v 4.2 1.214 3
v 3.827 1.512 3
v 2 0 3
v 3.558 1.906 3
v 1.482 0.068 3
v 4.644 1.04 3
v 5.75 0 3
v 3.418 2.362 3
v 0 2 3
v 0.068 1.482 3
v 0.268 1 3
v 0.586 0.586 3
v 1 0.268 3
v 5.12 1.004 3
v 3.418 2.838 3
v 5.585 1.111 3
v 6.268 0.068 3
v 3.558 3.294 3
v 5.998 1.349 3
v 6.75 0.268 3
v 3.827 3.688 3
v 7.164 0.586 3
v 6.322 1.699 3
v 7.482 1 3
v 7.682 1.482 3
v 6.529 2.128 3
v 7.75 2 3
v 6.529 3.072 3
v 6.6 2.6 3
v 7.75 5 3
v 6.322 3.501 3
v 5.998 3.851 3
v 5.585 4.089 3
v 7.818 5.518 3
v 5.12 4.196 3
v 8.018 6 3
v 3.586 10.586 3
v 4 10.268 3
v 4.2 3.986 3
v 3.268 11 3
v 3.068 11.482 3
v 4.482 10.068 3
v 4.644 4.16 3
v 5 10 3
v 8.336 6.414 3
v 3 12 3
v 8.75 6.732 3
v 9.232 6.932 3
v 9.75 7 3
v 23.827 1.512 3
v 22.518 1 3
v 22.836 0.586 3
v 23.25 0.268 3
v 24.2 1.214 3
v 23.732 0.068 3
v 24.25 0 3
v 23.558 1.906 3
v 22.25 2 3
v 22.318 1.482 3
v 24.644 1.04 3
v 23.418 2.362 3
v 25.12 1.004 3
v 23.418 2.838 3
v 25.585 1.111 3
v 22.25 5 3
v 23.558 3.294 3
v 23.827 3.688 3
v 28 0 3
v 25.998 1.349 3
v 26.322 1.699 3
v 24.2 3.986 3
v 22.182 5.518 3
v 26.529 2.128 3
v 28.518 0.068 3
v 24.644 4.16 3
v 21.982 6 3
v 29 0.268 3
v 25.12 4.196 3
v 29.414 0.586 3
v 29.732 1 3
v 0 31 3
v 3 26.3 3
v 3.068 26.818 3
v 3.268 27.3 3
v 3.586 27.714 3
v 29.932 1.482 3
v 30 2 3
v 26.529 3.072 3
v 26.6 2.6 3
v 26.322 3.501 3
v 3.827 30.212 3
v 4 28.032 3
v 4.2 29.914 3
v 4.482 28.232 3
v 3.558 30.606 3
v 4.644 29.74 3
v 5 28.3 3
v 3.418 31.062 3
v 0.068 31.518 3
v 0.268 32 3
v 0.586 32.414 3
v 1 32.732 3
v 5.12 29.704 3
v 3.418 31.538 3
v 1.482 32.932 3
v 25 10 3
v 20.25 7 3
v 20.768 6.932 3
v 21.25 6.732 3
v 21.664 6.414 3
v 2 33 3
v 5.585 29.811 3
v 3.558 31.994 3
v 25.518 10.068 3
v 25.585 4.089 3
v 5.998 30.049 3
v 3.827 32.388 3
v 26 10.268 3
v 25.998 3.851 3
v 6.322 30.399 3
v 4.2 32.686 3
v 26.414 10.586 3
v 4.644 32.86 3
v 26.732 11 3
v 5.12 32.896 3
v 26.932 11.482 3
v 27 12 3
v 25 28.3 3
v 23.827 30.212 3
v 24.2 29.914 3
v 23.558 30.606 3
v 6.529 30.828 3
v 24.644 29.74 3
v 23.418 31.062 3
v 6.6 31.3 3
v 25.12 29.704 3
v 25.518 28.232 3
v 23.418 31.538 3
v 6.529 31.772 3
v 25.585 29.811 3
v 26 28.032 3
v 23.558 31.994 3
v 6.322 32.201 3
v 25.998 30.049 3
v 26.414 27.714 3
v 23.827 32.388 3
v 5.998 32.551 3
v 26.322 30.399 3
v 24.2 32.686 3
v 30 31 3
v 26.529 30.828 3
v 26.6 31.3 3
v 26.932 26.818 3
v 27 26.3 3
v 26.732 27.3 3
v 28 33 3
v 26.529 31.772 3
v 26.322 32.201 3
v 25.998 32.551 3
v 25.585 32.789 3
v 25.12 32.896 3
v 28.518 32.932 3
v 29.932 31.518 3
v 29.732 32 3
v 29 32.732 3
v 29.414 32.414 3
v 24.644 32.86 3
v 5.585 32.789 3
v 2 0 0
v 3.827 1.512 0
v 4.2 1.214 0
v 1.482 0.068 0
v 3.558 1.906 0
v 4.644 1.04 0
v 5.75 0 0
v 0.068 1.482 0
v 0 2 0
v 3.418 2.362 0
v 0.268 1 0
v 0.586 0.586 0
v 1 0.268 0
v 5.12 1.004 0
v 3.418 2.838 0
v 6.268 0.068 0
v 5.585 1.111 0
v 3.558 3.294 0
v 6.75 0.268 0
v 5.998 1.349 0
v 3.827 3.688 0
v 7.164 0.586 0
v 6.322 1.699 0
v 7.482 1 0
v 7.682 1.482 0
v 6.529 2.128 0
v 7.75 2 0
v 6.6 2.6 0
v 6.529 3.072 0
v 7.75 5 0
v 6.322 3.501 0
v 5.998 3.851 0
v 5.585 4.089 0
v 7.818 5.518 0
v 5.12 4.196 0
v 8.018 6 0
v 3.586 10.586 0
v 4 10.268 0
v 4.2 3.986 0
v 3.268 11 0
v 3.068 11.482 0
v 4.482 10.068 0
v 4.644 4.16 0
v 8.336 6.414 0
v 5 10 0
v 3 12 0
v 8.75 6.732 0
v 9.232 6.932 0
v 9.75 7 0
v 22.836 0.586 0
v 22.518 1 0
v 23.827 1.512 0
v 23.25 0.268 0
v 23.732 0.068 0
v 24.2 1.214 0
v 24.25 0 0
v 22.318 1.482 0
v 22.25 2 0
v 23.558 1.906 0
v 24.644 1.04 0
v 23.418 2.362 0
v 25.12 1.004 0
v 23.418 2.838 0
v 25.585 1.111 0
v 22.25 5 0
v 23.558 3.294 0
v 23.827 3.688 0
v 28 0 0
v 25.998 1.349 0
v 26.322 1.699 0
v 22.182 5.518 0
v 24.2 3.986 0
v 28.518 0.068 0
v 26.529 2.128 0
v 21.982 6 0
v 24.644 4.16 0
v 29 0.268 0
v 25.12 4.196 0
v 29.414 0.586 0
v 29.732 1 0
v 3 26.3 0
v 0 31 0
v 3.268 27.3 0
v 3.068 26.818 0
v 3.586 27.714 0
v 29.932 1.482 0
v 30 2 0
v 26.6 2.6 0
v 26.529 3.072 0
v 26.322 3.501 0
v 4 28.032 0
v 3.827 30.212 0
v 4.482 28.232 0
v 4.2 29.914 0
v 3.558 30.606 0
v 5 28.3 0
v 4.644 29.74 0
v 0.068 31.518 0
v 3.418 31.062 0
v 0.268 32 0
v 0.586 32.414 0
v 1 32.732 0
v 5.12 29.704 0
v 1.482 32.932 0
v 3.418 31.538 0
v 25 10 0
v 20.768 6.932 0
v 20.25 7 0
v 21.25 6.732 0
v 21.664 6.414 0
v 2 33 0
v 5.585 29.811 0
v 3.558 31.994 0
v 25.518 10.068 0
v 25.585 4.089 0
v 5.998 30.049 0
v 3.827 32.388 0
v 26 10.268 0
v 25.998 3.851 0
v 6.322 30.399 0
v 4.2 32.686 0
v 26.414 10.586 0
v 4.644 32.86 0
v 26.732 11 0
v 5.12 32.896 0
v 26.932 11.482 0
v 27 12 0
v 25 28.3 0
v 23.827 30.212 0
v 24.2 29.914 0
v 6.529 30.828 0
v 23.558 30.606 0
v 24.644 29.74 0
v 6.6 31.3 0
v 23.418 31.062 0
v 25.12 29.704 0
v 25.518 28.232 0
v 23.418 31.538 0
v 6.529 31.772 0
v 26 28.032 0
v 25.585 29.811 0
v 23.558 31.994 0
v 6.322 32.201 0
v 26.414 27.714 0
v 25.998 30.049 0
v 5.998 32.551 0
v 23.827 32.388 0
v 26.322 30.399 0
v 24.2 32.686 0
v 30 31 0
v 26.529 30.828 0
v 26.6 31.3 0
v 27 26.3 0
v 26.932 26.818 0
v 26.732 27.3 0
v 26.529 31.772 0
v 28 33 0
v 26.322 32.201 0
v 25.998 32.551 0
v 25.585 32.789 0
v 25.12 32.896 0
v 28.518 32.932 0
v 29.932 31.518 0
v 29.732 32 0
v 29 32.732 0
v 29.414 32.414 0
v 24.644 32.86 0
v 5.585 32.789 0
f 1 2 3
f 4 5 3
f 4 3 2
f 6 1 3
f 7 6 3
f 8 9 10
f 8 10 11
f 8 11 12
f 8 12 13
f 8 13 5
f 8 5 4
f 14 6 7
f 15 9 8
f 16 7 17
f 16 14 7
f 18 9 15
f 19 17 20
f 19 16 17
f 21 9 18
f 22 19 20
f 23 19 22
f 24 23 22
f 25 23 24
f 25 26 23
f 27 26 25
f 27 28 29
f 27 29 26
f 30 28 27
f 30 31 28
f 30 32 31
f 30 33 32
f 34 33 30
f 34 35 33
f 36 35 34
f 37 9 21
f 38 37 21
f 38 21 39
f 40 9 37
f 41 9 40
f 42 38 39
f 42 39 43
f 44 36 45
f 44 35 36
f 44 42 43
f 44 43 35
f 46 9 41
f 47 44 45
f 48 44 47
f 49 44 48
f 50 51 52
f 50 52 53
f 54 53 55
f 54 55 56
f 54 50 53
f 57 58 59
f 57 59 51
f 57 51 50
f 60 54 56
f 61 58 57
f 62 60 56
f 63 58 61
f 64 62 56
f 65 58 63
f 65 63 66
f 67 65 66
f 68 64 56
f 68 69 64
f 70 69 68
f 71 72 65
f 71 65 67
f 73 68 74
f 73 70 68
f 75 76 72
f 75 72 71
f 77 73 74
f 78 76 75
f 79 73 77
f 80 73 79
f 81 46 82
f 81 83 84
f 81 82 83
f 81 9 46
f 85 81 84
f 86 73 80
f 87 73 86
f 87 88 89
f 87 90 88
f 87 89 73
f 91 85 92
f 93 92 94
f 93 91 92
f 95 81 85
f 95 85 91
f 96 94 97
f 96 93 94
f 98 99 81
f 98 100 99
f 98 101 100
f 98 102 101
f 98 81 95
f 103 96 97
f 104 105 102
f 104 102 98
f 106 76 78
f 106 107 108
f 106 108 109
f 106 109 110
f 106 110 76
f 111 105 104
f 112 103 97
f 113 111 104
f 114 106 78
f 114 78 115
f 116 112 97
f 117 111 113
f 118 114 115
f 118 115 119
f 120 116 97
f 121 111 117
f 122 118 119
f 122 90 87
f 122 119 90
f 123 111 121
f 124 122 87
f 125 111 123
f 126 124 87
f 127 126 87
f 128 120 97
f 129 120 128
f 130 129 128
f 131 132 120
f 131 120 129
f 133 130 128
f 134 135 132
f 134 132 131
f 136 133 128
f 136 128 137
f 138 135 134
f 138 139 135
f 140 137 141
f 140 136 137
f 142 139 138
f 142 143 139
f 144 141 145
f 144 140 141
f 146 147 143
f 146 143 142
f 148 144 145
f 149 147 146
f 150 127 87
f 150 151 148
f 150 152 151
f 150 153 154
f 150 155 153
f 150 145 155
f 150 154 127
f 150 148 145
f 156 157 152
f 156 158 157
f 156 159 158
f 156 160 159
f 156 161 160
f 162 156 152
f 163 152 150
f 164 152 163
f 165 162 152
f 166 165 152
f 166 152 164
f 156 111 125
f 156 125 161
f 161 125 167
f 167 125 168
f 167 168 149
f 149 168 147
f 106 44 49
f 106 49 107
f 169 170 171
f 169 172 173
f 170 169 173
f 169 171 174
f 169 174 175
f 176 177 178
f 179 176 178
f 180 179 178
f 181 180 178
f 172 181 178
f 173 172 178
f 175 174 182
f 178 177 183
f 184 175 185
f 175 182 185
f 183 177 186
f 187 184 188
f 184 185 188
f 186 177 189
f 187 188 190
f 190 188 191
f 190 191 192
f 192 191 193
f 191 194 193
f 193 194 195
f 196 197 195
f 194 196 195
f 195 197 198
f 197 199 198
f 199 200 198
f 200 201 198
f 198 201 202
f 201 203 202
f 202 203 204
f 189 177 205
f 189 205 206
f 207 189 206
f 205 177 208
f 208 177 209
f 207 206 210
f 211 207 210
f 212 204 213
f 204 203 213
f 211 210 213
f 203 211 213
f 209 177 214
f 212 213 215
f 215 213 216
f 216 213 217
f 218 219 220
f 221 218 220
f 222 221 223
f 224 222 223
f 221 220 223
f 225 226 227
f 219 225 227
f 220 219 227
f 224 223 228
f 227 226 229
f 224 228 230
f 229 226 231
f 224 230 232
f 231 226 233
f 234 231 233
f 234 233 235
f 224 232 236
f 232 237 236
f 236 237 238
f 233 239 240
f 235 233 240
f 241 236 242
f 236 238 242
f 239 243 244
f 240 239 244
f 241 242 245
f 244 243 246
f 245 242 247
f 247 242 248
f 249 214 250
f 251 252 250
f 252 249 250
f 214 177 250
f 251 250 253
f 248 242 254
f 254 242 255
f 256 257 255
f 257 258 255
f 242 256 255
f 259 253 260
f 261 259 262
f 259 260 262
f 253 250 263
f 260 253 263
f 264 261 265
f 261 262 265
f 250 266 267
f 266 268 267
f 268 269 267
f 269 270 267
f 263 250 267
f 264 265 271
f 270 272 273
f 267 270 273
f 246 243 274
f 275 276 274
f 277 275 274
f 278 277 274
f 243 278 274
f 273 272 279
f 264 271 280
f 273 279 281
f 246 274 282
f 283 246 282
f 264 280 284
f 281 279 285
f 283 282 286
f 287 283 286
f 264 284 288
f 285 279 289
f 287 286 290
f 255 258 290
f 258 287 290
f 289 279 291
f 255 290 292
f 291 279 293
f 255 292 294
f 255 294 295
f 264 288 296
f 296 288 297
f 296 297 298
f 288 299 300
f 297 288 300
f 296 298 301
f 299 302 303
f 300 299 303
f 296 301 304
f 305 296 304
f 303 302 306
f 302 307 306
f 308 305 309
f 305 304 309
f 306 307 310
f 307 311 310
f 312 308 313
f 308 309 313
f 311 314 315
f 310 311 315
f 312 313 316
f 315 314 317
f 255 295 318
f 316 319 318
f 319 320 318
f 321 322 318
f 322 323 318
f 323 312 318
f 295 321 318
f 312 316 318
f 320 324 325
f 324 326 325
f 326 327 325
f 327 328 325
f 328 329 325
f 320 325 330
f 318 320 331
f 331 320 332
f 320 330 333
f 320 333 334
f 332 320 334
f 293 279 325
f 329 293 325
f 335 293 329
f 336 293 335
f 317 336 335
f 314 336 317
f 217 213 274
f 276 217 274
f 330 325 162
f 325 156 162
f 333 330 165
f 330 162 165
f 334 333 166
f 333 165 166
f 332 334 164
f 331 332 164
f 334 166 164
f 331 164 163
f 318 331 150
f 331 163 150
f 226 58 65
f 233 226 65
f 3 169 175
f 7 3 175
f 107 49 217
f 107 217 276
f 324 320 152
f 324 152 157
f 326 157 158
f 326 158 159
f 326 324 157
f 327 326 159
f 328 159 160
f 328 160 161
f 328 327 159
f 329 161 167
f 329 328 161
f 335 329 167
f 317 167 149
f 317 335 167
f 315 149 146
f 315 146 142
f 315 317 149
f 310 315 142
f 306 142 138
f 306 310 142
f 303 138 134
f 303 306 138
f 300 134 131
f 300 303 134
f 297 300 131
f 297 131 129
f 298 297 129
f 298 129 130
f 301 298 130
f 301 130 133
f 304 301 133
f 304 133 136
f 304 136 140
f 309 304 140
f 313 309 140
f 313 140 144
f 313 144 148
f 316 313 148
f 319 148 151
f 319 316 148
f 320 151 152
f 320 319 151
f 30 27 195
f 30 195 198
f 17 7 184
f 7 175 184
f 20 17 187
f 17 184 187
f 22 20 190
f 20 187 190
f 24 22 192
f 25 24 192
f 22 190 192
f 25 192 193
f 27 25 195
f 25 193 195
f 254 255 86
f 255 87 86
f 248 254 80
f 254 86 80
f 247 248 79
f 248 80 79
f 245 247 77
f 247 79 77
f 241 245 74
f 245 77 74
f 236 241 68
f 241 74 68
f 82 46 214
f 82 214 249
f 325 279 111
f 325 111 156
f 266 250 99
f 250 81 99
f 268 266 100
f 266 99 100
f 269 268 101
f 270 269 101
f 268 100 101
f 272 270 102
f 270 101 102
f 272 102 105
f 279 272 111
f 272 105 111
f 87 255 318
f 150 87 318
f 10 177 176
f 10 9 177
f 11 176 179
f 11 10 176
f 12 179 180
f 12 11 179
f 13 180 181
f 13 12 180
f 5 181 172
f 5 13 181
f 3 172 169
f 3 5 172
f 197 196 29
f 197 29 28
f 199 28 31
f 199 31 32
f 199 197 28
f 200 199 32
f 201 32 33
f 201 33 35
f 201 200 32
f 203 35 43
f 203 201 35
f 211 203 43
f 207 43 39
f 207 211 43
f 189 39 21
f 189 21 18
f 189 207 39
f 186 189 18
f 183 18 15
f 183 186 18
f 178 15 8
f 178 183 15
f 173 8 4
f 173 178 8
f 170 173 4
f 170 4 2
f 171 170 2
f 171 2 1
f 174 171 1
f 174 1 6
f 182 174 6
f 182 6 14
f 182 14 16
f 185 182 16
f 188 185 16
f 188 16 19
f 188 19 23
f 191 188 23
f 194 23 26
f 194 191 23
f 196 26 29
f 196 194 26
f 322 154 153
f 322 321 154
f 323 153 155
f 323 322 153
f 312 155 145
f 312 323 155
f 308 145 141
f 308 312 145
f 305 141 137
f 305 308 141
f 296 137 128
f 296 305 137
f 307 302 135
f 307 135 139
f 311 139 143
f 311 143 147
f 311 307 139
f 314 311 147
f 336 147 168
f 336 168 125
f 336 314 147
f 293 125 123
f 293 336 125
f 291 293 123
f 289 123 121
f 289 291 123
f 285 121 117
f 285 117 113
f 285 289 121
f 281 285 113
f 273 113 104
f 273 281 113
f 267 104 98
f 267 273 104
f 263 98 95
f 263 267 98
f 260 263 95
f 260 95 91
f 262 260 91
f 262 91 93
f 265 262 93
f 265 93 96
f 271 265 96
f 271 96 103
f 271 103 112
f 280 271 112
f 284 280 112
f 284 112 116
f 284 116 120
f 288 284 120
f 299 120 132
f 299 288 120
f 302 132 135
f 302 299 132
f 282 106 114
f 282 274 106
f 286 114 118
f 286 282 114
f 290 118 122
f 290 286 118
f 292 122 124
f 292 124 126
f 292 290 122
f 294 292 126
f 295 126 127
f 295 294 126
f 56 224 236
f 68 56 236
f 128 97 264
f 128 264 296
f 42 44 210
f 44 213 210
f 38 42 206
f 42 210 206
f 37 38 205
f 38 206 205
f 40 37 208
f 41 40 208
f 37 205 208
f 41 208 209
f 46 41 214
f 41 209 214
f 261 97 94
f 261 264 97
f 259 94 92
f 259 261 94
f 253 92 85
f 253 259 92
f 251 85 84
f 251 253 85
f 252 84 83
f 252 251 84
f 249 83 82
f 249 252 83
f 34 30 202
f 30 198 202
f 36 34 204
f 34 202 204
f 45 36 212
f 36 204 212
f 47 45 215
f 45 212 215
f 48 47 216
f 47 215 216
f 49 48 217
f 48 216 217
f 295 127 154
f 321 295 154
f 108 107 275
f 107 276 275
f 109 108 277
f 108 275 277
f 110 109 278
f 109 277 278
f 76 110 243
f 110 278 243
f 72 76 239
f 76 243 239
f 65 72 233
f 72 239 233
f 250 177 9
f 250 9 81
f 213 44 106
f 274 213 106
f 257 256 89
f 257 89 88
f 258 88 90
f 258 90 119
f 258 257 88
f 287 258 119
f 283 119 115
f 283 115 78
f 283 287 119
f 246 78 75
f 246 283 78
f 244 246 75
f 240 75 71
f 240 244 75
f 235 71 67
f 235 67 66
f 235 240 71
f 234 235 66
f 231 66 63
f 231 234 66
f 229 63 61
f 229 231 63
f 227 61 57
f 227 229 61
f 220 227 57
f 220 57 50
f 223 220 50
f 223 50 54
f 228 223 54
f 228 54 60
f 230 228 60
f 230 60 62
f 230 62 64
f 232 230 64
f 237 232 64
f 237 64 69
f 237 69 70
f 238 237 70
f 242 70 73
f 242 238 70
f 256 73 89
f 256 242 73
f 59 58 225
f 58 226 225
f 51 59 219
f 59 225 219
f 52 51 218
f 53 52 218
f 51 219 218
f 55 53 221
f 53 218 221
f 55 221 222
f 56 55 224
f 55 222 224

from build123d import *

# Parameters (mm, degrees)
SKETCH_1_W          = 30
SKETCH_1_H          = 33
SKETCH_1_R          = 1.6
EXTRUDE_1_DEPTH     = 3
SKETCH_2_W          = 14.5
SKETCH_2_H          = 7
SKETCH_2_W_2        = 24
SKETCH_2_H_2        = 18.3
CUT_EXTRUDE_1_DEPTH = 4
FILLET_1_R          = 2
FILLET_2_R          = 2


with BuildPart() as part:
    # 草图1 → 凸台-拉伸1 (new body)
    with BuildSketch(Plane.XY):
        with Locations((15, 16.5)):
            Rectangle(SKETCH_1_W, SKETCH_1_H)
        with Locations((5, 31.3)):
            Circle(SKETCH_1_R, mode=Mode.SUBTRACT)
        with Locations((25, 31.3)):
            Circle(SKETCH_1_R, mode=Mode.SUBTRACT)
        with Locations((25, 2.6)):
            Circle(SKETCH_1_R, mode=Mode.SUBTRACT)
        with Locations((5, 2.6)):
            Circle(SKETCH_1_R, mode=Mode.SUBTRACT)
    extrude(amount=EXTRUDE_1_DEPTH)

    # 草图2 → 切除-拉伸1 (cut, through all)
    with BuildSketch(Plane.XY.offset(3)):
        with Locations((15, 3.5)):
            Rectangle(SKETCH_2_W, SKETCH_2_H)
        with Locations((15, 19.15)):
            Rectangle(SKETCH_2_W_2, SKETCH_2_H_2)
    extrude(amount=-CUT_EXTRUDE_1_DEPTH, mode=Mode.SUBTRACT)

    # 圆角1
    fillet_1_edges = [part.edges().sort_by_distance(p)[0] for p in [
        (0, 33, 1.5),
        (30, 33, 1.5),
        (30, 0, 1.5),
        (0, 0, 1.5),
    ]]
    fillet(fillet_1_edges, radius=FILLET_1_R)

    # 圆角2
    fillet_2_edges = [part.edges().sort_by_distance(p)[0] for p in [
        (7.75, 0, 1.5),
        (7.75, 7, 1.5),
        (22.25, 7, 1.5),
        (22.25, 0, 1.5),
        (3, 10, 1.5),
        (3, 28.3, 1.5),
        (27, 28.3, 1.5),
        (27, 10, 1.5),
    ]]
    fillet(fillet_2_edges, radius=FILLET_2_R)


solid = part.part
